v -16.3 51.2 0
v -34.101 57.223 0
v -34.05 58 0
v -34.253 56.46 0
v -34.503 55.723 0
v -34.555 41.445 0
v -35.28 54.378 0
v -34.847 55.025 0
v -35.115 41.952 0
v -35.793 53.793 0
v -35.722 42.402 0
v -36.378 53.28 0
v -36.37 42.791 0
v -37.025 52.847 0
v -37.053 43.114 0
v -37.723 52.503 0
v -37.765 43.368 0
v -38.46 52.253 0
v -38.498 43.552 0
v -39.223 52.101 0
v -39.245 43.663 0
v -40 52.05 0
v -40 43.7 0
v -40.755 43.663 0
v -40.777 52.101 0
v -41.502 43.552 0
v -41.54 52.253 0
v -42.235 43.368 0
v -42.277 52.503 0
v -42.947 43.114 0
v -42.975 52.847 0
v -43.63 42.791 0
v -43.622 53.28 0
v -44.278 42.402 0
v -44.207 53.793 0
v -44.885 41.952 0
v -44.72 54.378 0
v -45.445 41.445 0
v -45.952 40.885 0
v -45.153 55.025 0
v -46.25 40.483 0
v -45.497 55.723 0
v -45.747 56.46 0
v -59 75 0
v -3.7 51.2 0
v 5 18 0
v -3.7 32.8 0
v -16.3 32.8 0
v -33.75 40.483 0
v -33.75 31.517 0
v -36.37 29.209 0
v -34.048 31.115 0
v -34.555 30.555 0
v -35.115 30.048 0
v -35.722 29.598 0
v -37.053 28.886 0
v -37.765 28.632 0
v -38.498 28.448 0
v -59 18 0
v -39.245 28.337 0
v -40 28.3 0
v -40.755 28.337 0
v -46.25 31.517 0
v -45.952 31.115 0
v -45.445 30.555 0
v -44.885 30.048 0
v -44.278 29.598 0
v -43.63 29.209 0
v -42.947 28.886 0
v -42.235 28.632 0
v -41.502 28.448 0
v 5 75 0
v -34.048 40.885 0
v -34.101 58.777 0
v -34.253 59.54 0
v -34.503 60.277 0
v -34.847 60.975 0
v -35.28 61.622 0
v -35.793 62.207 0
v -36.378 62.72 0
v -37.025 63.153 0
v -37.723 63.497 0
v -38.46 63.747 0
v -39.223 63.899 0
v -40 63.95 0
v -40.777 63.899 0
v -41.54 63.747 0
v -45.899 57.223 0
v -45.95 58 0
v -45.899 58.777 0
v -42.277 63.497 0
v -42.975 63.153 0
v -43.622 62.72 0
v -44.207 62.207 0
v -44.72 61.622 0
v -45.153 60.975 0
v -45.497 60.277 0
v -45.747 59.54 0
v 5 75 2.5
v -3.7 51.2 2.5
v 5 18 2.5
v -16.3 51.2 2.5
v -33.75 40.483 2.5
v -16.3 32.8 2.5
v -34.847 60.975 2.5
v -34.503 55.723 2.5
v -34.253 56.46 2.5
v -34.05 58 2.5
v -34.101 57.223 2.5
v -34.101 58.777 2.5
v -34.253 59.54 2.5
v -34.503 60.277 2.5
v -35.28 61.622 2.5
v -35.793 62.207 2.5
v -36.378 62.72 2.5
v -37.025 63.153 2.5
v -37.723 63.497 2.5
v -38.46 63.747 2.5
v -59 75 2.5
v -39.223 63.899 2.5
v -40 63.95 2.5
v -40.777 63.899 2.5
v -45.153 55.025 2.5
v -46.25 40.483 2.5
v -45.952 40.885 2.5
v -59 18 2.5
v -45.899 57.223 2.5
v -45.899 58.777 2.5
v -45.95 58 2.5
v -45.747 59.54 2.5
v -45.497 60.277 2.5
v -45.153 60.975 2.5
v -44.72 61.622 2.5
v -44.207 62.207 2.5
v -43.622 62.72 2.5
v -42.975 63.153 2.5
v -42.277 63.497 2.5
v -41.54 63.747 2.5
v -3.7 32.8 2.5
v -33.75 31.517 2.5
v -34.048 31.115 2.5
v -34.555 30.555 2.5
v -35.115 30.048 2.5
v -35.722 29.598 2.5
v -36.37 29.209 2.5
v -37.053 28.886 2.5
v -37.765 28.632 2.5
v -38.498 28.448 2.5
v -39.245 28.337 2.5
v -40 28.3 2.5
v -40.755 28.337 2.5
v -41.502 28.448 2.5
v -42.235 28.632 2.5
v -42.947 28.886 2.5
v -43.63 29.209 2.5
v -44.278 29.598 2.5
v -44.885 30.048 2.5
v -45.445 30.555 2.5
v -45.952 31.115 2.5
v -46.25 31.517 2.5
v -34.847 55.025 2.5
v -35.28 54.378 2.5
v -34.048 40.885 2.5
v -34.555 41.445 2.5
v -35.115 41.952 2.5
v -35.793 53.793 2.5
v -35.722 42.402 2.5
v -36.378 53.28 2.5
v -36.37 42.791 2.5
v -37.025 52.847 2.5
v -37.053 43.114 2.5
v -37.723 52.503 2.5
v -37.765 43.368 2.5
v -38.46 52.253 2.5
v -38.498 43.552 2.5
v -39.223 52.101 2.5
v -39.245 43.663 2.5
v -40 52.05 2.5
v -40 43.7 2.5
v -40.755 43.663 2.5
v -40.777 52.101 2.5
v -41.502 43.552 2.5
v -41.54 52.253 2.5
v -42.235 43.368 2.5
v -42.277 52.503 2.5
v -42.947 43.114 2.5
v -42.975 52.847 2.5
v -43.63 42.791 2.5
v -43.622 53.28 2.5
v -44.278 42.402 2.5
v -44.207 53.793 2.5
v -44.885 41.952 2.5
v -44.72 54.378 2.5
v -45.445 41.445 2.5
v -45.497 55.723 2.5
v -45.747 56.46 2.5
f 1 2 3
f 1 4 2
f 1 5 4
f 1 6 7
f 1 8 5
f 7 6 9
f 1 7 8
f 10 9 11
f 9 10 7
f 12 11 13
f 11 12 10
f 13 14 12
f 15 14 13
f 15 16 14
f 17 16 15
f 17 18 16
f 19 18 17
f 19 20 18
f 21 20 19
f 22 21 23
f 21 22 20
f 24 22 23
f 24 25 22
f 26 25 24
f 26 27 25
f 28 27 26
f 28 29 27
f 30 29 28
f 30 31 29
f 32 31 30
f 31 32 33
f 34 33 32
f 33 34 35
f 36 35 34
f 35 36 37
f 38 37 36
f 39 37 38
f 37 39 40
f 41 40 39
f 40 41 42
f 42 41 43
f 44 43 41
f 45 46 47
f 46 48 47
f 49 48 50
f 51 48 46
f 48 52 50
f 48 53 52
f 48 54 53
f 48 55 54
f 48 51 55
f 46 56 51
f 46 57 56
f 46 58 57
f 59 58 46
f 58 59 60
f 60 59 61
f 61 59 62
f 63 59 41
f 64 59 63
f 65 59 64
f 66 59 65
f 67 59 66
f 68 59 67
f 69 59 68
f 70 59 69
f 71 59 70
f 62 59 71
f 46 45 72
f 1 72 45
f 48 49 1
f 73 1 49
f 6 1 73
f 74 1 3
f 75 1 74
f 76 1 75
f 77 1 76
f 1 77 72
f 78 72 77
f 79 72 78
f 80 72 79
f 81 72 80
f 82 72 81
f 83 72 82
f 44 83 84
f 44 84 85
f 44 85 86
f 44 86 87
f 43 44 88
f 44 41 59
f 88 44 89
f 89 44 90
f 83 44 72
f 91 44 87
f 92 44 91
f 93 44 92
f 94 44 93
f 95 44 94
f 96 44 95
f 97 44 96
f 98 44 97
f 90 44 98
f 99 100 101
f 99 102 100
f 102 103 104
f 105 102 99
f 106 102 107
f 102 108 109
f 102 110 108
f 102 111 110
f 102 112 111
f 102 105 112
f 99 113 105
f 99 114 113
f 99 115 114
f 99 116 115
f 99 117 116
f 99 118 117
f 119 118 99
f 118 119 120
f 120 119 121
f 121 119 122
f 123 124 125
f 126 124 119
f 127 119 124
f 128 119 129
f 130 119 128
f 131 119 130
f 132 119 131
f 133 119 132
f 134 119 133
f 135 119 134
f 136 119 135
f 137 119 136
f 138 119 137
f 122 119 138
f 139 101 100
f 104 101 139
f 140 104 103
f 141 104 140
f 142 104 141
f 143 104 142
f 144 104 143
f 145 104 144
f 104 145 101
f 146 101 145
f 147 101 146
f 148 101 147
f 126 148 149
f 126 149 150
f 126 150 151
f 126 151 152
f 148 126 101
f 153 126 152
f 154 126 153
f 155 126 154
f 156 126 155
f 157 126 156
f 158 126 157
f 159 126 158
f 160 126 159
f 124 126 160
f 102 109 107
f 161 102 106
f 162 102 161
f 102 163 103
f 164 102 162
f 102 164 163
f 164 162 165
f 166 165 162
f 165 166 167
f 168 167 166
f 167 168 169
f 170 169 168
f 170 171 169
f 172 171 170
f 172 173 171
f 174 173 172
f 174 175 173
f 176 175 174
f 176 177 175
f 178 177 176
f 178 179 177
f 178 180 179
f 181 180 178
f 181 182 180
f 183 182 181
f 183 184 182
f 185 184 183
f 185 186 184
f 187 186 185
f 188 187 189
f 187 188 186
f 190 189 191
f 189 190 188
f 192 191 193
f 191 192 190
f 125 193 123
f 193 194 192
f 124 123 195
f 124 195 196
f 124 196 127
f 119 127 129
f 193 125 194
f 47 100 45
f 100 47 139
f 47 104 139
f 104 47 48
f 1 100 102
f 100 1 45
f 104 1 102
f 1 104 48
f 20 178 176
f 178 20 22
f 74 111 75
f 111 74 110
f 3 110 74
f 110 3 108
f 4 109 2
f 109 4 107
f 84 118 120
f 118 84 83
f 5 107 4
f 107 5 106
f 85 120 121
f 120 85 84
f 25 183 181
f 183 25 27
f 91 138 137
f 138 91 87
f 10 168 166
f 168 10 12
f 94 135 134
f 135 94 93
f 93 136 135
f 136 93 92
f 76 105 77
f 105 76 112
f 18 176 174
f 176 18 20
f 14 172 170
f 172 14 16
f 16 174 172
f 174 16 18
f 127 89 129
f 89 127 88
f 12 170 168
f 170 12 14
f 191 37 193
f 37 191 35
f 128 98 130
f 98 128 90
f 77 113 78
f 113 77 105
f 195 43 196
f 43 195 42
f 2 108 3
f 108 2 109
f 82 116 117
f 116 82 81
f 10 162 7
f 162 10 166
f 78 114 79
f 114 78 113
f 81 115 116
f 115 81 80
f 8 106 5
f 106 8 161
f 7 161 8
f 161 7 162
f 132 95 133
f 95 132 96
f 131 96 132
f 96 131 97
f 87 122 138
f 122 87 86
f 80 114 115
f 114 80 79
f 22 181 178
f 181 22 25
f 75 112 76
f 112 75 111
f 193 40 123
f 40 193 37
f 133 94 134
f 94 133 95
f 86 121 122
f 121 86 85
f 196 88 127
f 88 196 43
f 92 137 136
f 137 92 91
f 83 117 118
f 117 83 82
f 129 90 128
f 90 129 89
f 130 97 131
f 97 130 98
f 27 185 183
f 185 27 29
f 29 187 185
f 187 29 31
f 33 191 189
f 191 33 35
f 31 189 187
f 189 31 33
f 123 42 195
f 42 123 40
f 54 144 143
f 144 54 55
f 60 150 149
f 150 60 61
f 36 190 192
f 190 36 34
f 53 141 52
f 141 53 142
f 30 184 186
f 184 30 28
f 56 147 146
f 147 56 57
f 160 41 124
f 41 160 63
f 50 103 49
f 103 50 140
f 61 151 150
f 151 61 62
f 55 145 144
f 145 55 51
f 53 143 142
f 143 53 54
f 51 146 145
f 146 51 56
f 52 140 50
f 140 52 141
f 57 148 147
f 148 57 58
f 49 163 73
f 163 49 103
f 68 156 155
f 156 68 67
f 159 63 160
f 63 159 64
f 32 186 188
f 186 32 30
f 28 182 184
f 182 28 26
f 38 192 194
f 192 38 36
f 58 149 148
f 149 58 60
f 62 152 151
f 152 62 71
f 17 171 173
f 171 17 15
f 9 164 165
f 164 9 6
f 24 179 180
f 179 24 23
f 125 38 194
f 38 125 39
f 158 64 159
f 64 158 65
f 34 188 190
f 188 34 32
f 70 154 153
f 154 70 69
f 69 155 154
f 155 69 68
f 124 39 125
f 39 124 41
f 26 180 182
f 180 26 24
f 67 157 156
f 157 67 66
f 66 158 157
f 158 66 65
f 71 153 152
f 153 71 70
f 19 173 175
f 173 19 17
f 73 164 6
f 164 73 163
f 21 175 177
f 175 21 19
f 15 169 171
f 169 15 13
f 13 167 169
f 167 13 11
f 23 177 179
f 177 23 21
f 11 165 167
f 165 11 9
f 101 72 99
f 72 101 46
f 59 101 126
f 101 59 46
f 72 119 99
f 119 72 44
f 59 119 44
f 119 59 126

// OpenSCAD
// file: ../../level2.scad
// Level 2 - shared dimensions for the drive deck, motor bracket, body and skirt.
// Frame: origin at the centre of the deck's TOP surface; +Z up, +Y = front (display), +X = right.
// The lazy Susan sits on the deck's plinth; the turntable pulley hangs through the deck's hole.
include <params.scad>

// ---- outline -------------------------------------------------------------------------------
l2_size   = [160, 160];     // footprint (rounded square), same for body and skirt
l2_r      = 14;             // corner radius
l2_h      = 90;             // body height (floor to the deck's underside... see body)
l2_wall   = 2.5;            // body walls

// ---- the reComputer under Level 2, and the skirt round it (skirt.scad) -------------------------
jetson    = [130.1, 121.1, 51];     // reComputer J4012, MEASURED (x, y, height) with its case top OFF;
                                    //   ports at the back, fan near the middle (~1 cm toward the front)
jetson_top = 7.1;                   // the case top, if fitted: 58.1 with it, MEASURED
air_gap   = 10;                     // over the case top when it's on (17 over the open board): the fan
                                    //   draws in from here
skirt_h   = jetson[2] + jetson_top + air_gap;   // 68.1: desk -> Level 2's floor
// body <-> skirt screws (M3 down through the body floor into inserts in the skirt): along the
// sides, outside the reComputer (x +/-65)
skirt_pts = [[-71, -45], [-71, 45], [71, -45], [71, 5]];   // clear of the buck (left),
                                    //   the perfboard (right front) and the motor (right back)

// ---- deck ----------------------------------------------------------------------------------
deck_t    = 4;              // deck plate: z = -deck_t .. 0
deck_hole = 112;            // reach the inner ring's bolts from below during assembly

// ---- lazy Susan + turntable pulley (turntable_pulley.scad) --------------------------------
z_ls      = plinth_h;                    // lazy Susan's underside (on the plinth): 2
z_plate   = z_ls + ls_h;                 // turntable plate's underside = inner ring top: 12.5
belt_drop = 24.5;                        // plate underside -> belt centre (turntable_pulley)
z_belt    = z_plate - belt_drop;         // -12: belt centre, below the deck top
pulley_R  = 100 * 2 / PI / 2;            // 31.83: ring pulley pitch radius (100 T)
pulley_bottom = z_belt - 3.2 - 1.6 - 2.2;  // -19: lowest point of the hanging pulley
clamp_r   = 35.5;                        // pulley's belt clamp block (its widest part)

// ---- motor ----------------------------------------------------------------------------------
motor_a   = -45;            // direction of the motor from the centre: back-right corner
motor_C   = 46;             // nominal centre distance; the bracket slides +/- tension_travel (42..50:
                            //   at 41 the motor pulley would touch the ring pulley's flange)
tension_travel = 4;
nema      = [42.3, 33.4];   // NEMA17 (MEASURED body length; not a pancake): square, body length
nema_shaft = 17.5;          // MEASURED shaft length above the face
nema_holes = 31;            // M3 screw spacing on its face
nema_boss = 22;             // centring boss on its face (dia), ~2 tall
mp_T      = 20;             // motor pulley teeth
mp_belt_c = 13 + 7.1 / 2;   // MEASURED: pulley pushed fully down on the motor, its toothed section
                            //   (7.1 wide; the belt is a standard 6 mm) runs 13..20.1 above the face
bracket_t = 3;              // motor plate thickness; the pulley passes down through its centre hole
bracket_drop = 3;           // the motor hangs this much LOWER than "pulley pushed fully down" needs:
                            //   on the first build the ring pulley sat ~2 mm below the motor pulley,
                            //   so the motor pulley now starts ~1 mm low and is raised on the shaft
                            //   to line the belt up (a few mm of adjustment either way)
z_motor_face  = z_belt - mp_belt_c - bracket_drop;   // -31.55
z_bracket_top = z_motor_face + bracket_t;    // -28.55
z_motor_bottom = z_motor_face - nema[1];     // -64.95
z_mp_top  = z_motor_face + bracket_drop + 13 + 7.1 + 1;   // ~-7.45 (pulley raised to the belt; EST top flange ~1 mm)
// main file
// Back-panel fit test: the Level 2 body's back wall round the switch, fuse holder and barrel jack,
// cut straight from l2_body.scad (so it's identical to the real print) - to check before the long
// body print:
//   * rocker switch (body 12.3 x 17.1, upright): snaps into the plain 12.6 x 18.4 cut-out in the
//     2.5 mm wall and stays put; ON at the top
//   * fuse holder (6 x 30 mm): double-D hole - slides in, doesn't turn, ring nut tightens flat
//   * barrel jack (5.5 x 2.1 IP68, 11.2 mm thread): 11.5 mm hole, flange + gasket outside, nut
//     inside - goes in without forcing, nut pulls the gasket flat; its nut clears the fuse's
// PRINT outer face down (as modelled here), no supports. PETG, same settings as the body.
use <../archive/l2_body.scad>

margin = 8;                        // wall kept round the features
x0 = -40 - 11 - margin;            // fuse / jack column at x = -40 (fuse ring nut ~20 across) ...
x1 = 5;                            // ... switch at x = -10 (flange 14.8 wide); stops short of the cable exit
z0 = -58 - 9 - margin;             // jack centre z -58 (flange / nut ~18 across) ...
z1 = -36 + 10 + margin;            // ... fuse centre z -36 (ring nut ~20)

// lay the wall flat: outer face (y = -80) on the bed
translate([0, 0, 80]) rotate([90, 0, 0])
    intersection() {
        l2_body();
        translate([x0, -81, z0]) cube([x1 - x0, 6, z1 - z0]);    // the back wall only (2.5 thick)
    }
